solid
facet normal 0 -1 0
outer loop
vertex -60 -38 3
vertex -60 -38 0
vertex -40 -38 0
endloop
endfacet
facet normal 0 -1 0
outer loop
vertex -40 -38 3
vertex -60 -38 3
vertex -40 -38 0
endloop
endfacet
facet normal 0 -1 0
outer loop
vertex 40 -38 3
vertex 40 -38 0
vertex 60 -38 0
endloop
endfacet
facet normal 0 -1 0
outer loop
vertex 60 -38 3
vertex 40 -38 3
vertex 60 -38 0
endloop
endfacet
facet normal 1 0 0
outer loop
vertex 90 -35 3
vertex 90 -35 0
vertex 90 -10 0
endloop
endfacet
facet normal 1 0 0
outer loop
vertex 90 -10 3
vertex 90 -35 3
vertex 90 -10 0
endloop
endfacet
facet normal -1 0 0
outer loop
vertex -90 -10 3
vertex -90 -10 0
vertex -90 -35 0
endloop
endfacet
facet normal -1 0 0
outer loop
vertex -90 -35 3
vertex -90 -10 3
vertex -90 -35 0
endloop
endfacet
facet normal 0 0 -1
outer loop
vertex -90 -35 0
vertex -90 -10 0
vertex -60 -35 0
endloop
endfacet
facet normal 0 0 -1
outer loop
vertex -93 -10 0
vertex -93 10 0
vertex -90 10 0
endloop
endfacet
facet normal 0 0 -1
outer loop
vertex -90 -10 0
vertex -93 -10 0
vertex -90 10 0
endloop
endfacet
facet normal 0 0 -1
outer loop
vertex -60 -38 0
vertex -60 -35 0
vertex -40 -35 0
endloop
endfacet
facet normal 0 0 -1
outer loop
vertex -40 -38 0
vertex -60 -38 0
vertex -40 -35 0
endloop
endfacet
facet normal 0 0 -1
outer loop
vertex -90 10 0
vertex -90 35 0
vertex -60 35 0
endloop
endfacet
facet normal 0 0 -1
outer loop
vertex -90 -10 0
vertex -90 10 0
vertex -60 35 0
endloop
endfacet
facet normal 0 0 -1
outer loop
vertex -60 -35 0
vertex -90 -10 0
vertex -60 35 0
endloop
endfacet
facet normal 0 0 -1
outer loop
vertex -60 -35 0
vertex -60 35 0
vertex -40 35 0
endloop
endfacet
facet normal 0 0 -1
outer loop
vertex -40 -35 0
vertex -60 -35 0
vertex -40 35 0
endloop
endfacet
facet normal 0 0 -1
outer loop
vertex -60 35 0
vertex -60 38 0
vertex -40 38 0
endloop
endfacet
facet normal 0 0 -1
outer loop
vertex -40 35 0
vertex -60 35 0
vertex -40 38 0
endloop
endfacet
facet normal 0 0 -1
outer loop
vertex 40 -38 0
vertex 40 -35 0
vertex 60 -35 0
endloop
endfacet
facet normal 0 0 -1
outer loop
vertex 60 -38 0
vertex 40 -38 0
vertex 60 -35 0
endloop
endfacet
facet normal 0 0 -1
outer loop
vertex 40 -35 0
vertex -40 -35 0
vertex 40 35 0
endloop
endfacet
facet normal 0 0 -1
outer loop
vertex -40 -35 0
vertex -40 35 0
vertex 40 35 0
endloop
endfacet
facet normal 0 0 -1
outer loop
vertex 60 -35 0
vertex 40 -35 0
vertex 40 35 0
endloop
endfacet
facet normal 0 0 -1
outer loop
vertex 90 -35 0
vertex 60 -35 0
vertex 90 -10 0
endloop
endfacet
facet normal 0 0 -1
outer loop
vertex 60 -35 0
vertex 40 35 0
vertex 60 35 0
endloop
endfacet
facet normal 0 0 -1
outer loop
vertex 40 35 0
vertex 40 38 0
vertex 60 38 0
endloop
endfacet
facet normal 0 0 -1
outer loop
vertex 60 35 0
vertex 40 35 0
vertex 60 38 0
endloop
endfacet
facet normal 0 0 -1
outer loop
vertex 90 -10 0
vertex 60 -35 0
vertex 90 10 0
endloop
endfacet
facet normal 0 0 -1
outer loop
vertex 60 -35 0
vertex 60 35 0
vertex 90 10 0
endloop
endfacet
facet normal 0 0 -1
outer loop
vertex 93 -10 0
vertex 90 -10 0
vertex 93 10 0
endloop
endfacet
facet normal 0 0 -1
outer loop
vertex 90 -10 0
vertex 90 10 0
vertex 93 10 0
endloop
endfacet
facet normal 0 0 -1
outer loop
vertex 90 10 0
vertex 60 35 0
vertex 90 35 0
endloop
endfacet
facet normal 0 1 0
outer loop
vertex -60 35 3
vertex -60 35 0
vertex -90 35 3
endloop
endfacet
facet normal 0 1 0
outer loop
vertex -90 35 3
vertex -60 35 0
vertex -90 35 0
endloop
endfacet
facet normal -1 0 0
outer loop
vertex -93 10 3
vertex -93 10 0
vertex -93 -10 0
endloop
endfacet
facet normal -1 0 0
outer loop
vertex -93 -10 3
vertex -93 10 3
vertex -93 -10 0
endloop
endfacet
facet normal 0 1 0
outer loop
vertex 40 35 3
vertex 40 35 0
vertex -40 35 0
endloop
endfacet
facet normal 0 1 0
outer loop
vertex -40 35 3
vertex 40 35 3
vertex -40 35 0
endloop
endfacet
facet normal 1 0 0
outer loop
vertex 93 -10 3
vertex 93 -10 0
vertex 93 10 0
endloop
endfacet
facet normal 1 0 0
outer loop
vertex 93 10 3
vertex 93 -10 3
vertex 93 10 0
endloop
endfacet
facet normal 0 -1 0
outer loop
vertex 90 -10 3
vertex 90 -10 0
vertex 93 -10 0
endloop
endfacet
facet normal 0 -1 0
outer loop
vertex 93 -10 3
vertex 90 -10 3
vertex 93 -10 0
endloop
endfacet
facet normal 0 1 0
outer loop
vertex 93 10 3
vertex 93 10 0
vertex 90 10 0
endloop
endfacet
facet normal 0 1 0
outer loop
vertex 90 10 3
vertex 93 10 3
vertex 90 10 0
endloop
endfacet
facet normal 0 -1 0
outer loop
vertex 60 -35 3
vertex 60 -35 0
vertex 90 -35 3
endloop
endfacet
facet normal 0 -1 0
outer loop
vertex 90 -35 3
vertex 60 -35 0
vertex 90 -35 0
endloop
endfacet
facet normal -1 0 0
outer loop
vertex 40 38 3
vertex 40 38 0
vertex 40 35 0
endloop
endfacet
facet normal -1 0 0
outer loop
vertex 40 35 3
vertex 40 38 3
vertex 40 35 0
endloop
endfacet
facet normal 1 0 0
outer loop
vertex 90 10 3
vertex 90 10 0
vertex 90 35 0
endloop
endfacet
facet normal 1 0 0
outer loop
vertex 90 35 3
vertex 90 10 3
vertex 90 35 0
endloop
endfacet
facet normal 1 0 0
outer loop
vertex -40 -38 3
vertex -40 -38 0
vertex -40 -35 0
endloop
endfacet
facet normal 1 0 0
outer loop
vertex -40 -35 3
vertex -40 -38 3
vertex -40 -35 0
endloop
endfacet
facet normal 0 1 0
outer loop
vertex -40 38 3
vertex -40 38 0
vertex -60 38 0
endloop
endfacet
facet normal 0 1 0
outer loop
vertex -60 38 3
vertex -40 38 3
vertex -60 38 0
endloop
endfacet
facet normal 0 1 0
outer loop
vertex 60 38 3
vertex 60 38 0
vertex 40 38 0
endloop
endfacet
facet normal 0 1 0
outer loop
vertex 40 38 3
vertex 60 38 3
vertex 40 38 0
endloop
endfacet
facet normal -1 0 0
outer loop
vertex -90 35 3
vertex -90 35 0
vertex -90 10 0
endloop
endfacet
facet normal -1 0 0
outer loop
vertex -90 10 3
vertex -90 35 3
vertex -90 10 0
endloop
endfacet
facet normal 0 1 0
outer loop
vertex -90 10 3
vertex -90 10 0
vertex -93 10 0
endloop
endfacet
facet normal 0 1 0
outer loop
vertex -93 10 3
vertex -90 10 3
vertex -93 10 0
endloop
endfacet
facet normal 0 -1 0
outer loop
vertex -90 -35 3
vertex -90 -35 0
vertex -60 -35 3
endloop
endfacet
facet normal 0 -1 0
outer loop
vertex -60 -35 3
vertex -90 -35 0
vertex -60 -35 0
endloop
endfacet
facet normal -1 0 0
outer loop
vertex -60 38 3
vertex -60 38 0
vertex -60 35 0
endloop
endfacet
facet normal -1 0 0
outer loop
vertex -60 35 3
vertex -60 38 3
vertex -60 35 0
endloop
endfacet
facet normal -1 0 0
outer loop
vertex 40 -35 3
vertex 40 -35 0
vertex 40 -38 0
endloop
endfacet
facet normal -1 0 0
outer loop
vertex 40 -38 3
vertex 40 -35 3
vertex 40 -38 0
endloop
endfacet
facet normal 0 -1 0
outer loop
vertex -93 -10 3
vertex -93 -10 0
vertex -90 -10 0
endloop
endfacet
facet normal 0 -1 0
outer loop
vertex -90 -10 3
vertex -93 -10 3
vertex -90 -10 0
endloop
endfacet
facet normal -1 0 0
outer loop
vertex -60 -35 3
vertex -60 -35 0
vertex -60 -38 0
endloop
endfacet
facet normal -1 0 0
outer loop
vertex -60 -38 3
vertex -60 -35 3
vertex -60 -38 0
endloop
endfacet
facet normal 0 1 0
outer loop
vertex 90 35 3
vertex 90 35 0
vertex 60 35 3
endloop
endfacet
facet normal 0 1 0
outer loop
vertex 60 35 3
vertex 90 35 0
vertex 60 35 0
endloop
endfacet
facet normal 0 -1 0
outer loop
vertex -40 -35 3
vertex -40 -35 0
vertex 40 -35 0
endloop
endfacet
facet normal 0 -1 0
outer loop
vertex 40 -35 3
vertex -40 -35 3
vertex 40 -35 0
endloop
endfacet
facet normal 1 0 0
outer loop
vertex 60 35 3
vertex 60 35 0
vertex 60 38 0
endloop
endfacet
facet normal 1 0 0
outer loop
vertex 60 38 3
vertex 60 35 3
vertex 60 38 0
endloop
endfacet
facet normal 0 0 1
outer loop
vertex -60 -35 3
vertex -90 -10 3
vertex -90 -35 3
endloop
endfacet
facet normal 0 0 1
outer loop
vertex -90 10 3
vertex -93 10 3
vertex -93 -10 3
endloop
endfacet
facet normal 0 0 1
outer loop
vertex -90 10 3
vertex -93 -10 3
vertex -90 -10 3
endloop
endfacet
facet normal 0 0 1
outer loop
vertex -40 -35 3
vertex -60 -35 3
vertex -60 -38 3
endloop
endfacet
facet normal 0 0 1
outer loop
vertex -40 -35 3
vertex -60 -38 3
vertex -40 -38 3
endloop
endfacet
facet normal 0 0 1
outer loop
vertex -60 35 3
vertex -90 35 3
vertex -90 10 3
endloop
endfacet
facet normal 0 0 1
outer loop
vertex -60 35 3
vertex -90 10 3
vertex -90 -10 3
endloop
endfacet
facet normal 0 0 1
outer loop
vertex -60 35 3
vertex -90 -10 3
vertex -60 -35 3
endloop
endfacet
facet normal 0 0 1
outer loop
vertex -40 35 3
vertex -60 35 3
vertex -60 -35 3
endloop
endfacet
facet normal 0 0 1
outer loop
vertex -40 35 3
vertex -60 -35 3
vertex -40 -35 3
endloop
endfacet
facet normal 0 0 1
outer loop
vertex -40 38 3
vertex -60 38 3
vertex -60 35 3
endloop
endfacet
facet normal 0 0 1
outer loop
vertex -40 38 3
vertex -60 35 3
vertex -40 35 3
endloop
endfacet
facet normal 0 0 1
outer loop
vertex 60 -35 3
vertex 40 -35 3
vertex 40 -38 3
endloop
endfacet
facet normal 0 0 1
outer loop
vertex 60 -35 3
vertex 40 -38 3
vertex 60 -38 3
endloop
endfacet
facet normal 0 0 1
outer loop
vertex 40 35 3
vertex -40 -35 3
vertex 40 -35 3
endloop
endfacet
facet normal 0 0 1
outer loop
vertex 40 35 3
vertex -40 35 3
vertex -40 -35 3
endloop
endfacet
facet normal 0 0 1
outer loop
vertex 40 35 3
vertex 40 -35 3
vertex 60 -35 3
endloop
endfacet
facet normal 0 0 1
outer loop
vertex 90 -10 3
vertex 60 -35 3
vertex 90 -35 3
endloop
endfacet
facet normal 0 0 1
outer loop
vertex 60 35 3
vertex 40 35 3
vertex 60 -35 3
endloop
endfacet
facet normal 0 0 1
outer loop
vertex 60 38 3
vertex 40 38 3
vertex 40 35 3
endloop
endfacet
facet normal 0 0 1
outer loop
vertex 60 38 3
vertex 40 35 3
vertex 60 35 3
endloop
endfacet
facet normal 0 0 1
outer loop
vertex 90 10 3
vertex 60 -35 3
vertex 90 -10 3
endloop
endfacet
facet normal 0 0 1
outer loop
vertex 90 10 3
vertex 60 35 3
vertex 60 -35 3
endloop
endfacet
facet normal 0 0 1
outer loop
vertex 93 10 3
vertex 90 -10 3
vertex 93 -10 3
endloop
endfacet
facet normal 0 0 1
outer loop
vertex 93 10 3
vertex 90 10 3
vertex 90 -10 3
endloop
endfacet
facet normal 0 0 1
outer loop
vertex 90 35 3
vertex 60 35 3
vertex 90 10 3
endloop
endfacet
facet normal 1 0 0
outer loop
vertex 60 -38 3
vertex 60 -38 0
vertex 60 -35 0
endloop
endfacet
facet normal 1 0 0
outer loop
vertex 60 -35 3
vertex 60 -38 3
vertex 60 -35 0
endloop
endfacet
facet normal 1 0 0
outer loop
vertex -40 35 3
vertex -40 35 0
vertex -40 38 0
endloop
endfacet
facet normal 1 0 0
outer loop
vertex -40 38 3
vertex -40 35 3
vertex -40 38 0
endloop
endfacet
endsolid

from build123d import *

# Parameters (mm, degrees)
F2_DEPTH = 3


# Not quite as in the source:
# - a feature names something its author has since deleted; it is built from what else it names


with BuildPart() as f2:
    # F1 (on Top) → F2 (new body)
    with BuildSketch(Plane.XY):
        Polygon((90, 10), (90, 35), (60, 35), (60, 38), (40, 38), (40, 35), (-40, 35), (-40, 38), (-60, 38), (-60, 35), (-90, 35), (-90, 10), (-93, 10), (-93, -10), (-90, -10), (-90, -35), (-60, -35), (-60, -38), (-40, -38), (-40, -35), (40, -35), (40, -38), (60, -38), (60, -35), (90, -35), (90, -10), (93, -10), (93, 10), align=None)
    extrude(amount=F2_DEPTH)


solid = f2.part
